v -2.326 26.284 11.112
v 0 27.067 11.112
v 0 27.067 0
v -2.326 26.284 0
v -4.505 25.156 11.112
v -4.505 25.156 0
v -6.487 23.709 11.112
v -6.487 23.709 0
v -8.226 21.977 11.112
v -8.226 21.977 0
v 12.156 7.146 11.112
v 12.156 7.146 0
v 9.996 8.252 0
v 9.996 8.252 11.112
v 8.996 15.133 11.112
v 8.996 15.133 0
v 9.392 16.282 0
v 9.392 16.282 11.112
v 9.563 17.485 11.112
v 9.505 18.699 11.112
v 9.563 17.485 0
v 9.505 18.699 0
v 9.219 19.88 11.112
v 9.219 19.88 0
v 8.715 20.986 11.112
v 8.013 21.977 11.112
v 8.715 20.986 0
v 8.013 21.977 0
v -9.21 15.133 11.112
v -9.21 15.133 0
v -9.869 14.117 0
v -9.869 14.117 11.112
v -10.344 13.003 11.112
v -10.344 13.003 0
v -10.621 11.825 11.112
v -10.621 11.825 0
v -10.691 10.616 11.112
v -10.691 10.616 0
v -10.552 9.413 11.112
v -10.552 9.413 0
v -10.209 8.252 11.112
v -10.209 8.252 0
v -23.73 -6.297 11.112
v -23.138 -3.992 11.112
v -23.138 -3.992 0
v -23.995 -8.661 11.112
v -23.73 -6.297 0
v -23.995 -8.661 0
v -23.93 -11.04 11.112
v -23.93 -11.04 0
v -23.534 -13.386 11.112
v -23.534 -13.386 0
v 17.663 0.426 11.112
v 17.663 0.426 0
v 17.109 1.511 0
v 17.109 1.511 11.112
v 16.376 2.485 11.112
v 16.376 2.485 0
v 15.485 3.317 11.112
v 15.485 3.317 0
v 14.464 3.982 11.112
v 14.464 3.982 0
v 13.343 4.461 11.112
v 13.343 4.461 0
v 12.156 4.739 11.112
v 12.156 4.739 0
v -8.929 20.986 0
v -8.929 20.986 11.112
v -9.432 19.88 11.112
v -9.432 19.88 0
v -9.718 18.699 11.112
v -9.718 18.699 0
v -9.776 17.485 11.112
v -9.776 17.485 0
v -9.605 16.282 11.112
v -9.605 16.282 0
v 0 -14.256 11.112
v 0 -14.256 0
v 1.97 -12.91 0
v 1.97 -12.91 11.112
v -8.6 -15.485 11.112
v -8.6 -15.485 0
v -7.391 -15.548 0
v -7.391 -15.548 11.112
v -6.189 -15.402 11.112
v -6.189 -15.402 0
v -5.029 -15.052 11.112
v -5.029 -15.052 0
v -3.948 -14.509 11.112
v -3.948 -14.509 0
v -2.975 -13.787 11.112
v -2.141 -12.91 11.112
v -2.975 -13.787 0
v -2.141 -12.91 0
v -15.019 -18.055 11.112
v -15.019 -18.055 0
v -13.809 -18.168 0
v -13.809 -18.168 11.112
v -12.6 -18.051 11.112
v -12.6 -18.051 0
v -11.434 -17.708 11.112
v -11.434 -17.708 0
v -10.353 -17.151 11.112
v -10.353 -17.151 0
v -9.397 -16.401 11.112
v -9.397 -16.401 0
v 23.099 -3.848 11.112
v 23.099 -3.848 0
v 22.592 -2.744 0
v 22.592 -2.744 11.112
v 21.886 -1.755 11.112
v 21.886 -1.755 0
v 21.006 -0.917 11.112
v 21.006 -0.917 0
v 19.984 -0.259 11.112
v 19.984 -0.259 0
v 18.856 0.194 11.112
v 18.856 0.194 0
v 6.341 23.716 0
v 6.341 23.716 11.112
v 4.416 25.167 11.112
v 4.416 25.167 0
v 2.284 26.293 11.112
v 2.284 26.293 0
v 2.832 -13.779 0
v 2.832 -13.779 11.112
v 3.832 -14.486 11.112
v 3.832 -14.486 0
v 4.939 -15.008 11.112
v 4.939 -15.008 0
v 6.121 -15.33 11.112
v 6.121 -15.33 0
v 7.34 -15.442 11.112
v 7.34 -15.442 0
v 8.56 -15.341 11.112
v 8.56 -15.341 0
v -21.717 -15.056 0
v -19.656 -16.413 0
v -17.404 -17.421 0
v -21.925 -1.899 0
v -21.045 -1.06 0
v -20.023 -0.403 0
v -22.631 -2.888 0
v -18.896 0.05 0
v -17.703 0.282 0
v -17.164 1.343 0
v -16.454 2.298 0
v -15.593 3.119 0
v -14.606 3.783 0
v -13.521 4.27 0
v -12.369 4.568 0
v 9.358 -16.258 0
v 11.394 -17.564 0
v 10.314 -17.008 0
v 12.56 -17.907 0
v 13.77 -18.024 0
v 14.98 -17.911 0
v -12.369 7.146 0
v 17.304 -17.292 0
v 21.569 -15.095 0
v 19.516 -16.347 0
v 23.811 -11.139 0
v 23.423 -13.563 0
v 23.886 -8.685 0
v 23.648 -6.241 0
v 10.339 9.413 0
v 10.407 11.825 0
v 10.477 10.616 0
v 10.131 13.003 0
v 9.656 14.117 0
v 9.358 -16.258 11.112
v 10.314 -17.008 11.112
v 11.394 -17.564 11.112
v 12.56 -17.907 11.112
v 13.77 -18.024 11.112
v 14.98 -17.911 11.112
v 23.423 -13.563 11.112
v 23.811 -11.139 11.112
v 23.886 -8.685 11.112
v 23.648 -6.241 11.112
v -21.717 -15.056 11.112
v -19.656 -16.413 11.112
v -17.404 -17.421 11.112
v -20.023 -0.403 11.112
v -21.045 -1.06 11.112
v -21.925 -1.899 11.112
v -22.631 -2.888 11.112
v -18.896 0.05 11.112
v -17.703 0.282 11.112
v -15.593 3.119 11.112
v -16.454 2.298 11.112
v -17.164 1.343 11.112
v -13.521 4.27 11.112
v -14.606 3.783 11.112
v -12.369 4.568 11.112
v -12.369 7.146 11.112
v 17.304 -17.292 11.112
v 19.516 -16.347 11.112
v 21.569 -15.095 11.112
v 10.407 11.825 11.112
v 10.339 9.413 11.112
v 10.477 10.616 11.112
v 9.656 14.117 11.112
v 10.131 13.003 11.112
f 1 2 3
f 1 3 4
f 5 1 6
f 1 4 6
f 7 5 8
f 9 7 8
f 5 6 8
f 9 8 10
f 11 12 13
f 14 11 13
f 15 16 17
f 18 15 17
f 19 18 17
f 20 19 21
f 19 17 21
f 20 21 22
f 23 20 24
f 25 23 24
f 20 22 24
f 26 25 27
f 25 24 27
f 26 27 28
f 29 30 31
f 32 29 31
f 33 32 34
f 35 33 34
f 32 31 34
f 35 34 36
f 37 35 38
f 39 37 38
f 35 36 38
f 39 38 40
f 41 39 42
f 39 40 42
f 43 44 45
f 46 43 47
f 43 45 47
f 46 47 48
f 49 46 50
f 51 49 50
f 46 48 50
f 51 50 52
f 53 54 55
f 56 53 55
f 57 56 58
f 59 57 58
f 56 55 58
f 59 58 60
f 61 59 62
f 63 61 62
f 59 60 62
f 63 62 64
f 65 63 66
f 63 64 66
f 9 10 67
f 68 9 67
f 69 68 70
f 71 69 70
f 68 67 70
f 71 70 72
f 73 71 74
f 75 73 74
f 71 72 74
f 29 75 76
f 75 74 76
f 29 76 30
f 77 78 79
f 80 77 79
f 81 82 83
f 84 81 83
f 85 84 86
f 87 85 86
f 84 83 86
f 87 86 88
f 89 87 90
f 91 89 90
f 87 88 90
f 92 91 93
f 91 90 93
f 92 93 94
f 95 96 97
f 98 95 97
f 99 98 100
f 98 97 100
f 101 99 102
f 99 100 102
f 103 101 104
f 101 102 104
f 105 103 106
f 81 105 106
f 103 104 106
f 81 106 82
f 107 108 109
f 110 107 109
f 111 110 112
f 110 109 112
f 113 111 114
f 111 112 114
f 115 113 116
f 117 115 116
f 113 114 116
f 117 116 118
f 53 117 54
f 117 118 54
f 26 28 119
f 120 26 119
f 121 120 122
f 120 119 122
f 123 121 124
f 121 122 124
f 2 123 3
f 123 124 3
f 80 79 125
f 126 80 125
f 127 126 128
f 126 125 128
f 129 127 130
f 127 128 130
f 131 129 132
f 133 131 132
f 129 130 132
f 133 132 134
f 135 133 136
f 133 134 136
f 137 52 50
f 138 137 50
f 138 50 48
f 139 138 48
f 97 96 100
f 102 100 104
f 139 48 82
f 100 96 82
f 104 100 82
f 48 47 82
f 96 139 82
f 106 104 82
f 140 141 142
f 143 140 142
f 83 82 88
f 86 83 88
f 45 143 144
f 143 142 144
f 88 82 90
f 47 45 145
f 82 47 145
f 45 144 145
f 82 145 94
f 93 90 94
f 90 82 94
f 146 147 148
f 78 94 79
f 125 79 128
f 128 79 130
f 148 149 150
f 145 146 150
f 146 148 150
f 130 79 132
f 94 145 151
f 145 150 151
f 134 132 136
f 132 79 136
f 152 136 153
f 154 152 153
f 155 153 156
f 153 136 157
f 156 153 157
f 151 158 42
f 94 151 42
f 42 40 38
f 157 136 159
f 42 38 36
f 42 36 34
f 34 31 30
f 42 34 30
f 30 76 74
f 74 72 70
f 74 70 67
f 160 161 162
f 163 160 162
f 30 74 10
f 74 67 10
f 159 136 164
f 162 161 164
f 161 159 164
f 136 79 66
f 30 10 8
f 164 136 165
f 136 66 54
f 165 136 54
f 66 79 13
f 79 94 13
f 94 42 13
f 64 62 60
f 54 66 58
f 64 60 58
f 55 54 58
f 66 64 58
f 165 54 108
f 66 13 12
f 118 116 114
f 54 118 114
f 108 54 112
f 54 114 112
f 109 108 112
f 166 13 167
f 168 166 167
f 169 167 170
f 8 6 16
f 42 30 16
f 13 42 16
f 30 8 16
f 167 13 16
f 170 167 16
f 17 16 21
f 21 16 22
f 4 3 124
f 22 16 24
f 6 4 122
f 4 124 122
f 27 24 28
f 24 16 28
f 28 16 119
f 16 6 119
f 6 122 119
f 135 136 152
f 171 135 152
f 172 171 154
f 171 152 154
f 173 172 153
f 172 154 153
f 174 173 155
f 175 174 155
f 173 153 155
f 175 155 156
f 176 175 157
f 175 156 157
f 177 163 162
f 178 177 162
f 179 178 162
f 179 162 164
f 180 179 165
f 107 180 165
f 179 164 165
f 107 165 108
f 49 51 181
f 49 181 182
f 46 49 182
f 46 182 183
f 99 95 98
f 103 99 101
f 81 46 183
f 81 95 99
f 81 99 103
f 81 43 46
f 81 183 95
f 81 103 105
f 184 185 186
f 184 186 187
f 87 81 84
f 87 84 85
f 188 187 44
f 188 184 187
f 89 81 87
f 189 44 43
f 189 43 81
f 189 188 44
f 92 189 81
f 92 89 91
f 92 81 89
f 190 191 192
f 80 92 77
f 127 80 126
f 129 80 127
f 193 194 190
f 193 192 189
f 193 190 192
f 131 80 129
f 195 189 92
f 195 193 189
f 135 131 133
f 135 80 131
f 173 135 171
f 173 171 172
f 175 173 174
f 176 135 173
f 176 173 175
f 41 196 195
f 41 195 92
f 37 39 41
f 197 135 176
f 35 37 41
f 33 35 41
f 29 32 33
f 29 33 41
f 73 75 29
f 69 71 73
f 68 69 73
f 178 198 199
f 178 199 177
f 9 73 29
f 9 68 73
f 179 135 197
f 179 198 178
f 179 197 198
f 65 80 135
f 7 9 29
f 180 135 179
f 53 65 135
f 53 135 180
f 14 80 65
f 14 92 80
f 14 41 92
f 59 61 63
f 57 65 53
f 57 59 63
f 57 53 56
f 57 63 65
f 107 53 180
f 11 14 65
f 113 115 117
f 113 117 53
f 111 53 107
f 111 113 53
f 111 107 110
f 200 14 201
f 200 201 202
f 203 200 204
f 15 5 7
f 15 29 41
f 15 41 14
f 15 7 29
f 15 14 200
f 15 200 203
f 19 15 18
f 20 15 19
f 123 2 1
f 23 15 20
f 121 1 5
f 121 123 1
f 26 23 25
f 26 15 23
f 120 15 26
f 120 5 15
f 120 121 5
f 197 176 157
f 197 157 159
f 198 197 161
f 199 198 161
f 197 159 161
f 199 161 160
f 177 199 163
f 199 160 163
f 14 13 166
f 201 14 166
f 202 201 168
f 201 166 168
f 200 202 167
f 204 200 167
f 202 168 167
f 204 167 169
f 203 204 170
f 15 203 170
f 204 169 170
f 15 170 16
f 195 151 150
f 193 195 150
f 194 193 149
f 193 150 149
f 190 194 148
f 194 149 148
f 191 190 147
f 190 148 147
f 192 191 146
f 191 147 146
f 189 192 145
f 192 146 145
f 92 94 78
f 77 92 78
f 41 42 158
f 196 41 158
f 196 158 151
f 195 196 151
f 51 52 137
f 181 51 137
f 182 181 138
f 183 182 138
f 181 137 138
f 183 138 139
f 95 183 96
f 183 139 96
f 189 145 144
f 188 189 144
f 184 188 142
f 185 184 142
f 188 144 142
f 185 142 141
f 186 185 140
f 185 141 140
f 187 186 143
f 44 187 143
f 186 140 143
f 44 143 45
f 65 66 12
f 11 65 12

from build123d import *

# Parameters (mm, degrees)
F1_DEPTH = 11.1125


# Not quite as in the source:
# - a length typed as a fraction of an inch, garbled in the dataset ("3 / 203.2 mm" for 3/8 in), is restored


with BuildPart() as f1:
    # F0 (on Top) → F1 (new body)
    with BuildSketch(Plane.XY):
        with BuildLine():
            ThreePointArc((0, 27.0671695471), (-4.5048536548, 25.1556778504), (-8.2258973271, 21.977417171))
            ThreePointArc((-8.2258973271, 21.977417171), (-9.7181261566, 18.698842434), (-9.2097157612, 15.1327075437))
            ThreePointArc((-9.2097157612, 15.1327075437), (-10.6205392688, 11.8246856933), (-10.2093555033, 8.2519613206))
            Line((-10.2093555033, 8.2519613206), (-12.369341217, 7.1464567445))
            Line((-12.369341217, 7.1464567445), (-12.369341217, 4.6386048198))
            Line((-12.369341217, 4.6386048198), (-12.369341217, 4.5682978211))
            ThreePointArc((-12.369341217, 4.5682978211), (-15.5930977879, 3.1185654947), (-17.7027139134, 0.2823972963))
            ThreePointArc((-17.7027139134, 0.2823972963), (-21.0452825194, -1.0603738309), (-23.1384971151, -3.9919692741))
            ThreePointArc((-23.1384971151, -3.9919692741), (-23.9954710425, -8.6613028545), (-23.5336683691, -13.3861117065))
            ThreePointArc((-23.5336683691, -13.3861117065), (-19.6562098094, -16.4130421994), (-15.0192606046, -18.054899429))
            ThreePointArc((-15.0192606046, -18.054899429), (-11.4338171794, -17.7079201351), (-8.5996589687, -15.484556372))
            ThreePointArc((-8.5996589687, -15.484556372), (-5.0294162563, -15.0523544446), (-2.1409380715, -12.9098966718))
            Line((-2.1409380715, -12.9098966718), (0, -14.2561570176))
            Line((0, -14.2561570176), (1.9696742658, -12.9098966718))
            ThreePointArc((1.9696742658, -12.9098966718), (4.9392756736, -15.0084468105), (8.560301624, -15.3410370587))
            ThreePointArc((8.560301624, -15.3410370587), (11.3944598347, -17.5644008218), (14.9799032599, -17.9113801157))
            ThreePointArc((14.9799032599, -17.9113801157), (19.5156578324, -16.3470620723), (23.423301056, -13.563092798))
            ThreePointArc((23.423301056, -13.563092798), (23.8861103651, -8.6849198531), (23.0991397704, -3.8484499608))
            ThreePointArc((23.0991397704, -3.8484499608), (21.0059251747, -0.9168545176), (17.6633565687, 0.4259166096))
            ThreePointArc((17.6633565687, 0.4259166096), (15.4847616458, 3.3168082822), (12.1560195839, 4.739132713))
            Line((12.1560195839, 4.739132713), (12.1560195839, 7.1464567445))
            Line((12.1560195839, 7.1464567445), (9.9960338703, 8.2519613206))
            ThreePointArc((9.9960338703, 8.2519613206), (10.4072176357, 11.8246856933), (8.9963941282, 15.1327075437))
            ThreePointArc((8.9963941282, 15.1327075437), (9.5048045235, 18.698842434), (8.012575694, 21.977417171))
            ThreePointArc((8.012575694, 21.977417171), (4.4155385291, 25.1665589), (0, 27.0671695471))
        make_face()
    extrude(amount=F1_DEPTH)


solid = f1.part
